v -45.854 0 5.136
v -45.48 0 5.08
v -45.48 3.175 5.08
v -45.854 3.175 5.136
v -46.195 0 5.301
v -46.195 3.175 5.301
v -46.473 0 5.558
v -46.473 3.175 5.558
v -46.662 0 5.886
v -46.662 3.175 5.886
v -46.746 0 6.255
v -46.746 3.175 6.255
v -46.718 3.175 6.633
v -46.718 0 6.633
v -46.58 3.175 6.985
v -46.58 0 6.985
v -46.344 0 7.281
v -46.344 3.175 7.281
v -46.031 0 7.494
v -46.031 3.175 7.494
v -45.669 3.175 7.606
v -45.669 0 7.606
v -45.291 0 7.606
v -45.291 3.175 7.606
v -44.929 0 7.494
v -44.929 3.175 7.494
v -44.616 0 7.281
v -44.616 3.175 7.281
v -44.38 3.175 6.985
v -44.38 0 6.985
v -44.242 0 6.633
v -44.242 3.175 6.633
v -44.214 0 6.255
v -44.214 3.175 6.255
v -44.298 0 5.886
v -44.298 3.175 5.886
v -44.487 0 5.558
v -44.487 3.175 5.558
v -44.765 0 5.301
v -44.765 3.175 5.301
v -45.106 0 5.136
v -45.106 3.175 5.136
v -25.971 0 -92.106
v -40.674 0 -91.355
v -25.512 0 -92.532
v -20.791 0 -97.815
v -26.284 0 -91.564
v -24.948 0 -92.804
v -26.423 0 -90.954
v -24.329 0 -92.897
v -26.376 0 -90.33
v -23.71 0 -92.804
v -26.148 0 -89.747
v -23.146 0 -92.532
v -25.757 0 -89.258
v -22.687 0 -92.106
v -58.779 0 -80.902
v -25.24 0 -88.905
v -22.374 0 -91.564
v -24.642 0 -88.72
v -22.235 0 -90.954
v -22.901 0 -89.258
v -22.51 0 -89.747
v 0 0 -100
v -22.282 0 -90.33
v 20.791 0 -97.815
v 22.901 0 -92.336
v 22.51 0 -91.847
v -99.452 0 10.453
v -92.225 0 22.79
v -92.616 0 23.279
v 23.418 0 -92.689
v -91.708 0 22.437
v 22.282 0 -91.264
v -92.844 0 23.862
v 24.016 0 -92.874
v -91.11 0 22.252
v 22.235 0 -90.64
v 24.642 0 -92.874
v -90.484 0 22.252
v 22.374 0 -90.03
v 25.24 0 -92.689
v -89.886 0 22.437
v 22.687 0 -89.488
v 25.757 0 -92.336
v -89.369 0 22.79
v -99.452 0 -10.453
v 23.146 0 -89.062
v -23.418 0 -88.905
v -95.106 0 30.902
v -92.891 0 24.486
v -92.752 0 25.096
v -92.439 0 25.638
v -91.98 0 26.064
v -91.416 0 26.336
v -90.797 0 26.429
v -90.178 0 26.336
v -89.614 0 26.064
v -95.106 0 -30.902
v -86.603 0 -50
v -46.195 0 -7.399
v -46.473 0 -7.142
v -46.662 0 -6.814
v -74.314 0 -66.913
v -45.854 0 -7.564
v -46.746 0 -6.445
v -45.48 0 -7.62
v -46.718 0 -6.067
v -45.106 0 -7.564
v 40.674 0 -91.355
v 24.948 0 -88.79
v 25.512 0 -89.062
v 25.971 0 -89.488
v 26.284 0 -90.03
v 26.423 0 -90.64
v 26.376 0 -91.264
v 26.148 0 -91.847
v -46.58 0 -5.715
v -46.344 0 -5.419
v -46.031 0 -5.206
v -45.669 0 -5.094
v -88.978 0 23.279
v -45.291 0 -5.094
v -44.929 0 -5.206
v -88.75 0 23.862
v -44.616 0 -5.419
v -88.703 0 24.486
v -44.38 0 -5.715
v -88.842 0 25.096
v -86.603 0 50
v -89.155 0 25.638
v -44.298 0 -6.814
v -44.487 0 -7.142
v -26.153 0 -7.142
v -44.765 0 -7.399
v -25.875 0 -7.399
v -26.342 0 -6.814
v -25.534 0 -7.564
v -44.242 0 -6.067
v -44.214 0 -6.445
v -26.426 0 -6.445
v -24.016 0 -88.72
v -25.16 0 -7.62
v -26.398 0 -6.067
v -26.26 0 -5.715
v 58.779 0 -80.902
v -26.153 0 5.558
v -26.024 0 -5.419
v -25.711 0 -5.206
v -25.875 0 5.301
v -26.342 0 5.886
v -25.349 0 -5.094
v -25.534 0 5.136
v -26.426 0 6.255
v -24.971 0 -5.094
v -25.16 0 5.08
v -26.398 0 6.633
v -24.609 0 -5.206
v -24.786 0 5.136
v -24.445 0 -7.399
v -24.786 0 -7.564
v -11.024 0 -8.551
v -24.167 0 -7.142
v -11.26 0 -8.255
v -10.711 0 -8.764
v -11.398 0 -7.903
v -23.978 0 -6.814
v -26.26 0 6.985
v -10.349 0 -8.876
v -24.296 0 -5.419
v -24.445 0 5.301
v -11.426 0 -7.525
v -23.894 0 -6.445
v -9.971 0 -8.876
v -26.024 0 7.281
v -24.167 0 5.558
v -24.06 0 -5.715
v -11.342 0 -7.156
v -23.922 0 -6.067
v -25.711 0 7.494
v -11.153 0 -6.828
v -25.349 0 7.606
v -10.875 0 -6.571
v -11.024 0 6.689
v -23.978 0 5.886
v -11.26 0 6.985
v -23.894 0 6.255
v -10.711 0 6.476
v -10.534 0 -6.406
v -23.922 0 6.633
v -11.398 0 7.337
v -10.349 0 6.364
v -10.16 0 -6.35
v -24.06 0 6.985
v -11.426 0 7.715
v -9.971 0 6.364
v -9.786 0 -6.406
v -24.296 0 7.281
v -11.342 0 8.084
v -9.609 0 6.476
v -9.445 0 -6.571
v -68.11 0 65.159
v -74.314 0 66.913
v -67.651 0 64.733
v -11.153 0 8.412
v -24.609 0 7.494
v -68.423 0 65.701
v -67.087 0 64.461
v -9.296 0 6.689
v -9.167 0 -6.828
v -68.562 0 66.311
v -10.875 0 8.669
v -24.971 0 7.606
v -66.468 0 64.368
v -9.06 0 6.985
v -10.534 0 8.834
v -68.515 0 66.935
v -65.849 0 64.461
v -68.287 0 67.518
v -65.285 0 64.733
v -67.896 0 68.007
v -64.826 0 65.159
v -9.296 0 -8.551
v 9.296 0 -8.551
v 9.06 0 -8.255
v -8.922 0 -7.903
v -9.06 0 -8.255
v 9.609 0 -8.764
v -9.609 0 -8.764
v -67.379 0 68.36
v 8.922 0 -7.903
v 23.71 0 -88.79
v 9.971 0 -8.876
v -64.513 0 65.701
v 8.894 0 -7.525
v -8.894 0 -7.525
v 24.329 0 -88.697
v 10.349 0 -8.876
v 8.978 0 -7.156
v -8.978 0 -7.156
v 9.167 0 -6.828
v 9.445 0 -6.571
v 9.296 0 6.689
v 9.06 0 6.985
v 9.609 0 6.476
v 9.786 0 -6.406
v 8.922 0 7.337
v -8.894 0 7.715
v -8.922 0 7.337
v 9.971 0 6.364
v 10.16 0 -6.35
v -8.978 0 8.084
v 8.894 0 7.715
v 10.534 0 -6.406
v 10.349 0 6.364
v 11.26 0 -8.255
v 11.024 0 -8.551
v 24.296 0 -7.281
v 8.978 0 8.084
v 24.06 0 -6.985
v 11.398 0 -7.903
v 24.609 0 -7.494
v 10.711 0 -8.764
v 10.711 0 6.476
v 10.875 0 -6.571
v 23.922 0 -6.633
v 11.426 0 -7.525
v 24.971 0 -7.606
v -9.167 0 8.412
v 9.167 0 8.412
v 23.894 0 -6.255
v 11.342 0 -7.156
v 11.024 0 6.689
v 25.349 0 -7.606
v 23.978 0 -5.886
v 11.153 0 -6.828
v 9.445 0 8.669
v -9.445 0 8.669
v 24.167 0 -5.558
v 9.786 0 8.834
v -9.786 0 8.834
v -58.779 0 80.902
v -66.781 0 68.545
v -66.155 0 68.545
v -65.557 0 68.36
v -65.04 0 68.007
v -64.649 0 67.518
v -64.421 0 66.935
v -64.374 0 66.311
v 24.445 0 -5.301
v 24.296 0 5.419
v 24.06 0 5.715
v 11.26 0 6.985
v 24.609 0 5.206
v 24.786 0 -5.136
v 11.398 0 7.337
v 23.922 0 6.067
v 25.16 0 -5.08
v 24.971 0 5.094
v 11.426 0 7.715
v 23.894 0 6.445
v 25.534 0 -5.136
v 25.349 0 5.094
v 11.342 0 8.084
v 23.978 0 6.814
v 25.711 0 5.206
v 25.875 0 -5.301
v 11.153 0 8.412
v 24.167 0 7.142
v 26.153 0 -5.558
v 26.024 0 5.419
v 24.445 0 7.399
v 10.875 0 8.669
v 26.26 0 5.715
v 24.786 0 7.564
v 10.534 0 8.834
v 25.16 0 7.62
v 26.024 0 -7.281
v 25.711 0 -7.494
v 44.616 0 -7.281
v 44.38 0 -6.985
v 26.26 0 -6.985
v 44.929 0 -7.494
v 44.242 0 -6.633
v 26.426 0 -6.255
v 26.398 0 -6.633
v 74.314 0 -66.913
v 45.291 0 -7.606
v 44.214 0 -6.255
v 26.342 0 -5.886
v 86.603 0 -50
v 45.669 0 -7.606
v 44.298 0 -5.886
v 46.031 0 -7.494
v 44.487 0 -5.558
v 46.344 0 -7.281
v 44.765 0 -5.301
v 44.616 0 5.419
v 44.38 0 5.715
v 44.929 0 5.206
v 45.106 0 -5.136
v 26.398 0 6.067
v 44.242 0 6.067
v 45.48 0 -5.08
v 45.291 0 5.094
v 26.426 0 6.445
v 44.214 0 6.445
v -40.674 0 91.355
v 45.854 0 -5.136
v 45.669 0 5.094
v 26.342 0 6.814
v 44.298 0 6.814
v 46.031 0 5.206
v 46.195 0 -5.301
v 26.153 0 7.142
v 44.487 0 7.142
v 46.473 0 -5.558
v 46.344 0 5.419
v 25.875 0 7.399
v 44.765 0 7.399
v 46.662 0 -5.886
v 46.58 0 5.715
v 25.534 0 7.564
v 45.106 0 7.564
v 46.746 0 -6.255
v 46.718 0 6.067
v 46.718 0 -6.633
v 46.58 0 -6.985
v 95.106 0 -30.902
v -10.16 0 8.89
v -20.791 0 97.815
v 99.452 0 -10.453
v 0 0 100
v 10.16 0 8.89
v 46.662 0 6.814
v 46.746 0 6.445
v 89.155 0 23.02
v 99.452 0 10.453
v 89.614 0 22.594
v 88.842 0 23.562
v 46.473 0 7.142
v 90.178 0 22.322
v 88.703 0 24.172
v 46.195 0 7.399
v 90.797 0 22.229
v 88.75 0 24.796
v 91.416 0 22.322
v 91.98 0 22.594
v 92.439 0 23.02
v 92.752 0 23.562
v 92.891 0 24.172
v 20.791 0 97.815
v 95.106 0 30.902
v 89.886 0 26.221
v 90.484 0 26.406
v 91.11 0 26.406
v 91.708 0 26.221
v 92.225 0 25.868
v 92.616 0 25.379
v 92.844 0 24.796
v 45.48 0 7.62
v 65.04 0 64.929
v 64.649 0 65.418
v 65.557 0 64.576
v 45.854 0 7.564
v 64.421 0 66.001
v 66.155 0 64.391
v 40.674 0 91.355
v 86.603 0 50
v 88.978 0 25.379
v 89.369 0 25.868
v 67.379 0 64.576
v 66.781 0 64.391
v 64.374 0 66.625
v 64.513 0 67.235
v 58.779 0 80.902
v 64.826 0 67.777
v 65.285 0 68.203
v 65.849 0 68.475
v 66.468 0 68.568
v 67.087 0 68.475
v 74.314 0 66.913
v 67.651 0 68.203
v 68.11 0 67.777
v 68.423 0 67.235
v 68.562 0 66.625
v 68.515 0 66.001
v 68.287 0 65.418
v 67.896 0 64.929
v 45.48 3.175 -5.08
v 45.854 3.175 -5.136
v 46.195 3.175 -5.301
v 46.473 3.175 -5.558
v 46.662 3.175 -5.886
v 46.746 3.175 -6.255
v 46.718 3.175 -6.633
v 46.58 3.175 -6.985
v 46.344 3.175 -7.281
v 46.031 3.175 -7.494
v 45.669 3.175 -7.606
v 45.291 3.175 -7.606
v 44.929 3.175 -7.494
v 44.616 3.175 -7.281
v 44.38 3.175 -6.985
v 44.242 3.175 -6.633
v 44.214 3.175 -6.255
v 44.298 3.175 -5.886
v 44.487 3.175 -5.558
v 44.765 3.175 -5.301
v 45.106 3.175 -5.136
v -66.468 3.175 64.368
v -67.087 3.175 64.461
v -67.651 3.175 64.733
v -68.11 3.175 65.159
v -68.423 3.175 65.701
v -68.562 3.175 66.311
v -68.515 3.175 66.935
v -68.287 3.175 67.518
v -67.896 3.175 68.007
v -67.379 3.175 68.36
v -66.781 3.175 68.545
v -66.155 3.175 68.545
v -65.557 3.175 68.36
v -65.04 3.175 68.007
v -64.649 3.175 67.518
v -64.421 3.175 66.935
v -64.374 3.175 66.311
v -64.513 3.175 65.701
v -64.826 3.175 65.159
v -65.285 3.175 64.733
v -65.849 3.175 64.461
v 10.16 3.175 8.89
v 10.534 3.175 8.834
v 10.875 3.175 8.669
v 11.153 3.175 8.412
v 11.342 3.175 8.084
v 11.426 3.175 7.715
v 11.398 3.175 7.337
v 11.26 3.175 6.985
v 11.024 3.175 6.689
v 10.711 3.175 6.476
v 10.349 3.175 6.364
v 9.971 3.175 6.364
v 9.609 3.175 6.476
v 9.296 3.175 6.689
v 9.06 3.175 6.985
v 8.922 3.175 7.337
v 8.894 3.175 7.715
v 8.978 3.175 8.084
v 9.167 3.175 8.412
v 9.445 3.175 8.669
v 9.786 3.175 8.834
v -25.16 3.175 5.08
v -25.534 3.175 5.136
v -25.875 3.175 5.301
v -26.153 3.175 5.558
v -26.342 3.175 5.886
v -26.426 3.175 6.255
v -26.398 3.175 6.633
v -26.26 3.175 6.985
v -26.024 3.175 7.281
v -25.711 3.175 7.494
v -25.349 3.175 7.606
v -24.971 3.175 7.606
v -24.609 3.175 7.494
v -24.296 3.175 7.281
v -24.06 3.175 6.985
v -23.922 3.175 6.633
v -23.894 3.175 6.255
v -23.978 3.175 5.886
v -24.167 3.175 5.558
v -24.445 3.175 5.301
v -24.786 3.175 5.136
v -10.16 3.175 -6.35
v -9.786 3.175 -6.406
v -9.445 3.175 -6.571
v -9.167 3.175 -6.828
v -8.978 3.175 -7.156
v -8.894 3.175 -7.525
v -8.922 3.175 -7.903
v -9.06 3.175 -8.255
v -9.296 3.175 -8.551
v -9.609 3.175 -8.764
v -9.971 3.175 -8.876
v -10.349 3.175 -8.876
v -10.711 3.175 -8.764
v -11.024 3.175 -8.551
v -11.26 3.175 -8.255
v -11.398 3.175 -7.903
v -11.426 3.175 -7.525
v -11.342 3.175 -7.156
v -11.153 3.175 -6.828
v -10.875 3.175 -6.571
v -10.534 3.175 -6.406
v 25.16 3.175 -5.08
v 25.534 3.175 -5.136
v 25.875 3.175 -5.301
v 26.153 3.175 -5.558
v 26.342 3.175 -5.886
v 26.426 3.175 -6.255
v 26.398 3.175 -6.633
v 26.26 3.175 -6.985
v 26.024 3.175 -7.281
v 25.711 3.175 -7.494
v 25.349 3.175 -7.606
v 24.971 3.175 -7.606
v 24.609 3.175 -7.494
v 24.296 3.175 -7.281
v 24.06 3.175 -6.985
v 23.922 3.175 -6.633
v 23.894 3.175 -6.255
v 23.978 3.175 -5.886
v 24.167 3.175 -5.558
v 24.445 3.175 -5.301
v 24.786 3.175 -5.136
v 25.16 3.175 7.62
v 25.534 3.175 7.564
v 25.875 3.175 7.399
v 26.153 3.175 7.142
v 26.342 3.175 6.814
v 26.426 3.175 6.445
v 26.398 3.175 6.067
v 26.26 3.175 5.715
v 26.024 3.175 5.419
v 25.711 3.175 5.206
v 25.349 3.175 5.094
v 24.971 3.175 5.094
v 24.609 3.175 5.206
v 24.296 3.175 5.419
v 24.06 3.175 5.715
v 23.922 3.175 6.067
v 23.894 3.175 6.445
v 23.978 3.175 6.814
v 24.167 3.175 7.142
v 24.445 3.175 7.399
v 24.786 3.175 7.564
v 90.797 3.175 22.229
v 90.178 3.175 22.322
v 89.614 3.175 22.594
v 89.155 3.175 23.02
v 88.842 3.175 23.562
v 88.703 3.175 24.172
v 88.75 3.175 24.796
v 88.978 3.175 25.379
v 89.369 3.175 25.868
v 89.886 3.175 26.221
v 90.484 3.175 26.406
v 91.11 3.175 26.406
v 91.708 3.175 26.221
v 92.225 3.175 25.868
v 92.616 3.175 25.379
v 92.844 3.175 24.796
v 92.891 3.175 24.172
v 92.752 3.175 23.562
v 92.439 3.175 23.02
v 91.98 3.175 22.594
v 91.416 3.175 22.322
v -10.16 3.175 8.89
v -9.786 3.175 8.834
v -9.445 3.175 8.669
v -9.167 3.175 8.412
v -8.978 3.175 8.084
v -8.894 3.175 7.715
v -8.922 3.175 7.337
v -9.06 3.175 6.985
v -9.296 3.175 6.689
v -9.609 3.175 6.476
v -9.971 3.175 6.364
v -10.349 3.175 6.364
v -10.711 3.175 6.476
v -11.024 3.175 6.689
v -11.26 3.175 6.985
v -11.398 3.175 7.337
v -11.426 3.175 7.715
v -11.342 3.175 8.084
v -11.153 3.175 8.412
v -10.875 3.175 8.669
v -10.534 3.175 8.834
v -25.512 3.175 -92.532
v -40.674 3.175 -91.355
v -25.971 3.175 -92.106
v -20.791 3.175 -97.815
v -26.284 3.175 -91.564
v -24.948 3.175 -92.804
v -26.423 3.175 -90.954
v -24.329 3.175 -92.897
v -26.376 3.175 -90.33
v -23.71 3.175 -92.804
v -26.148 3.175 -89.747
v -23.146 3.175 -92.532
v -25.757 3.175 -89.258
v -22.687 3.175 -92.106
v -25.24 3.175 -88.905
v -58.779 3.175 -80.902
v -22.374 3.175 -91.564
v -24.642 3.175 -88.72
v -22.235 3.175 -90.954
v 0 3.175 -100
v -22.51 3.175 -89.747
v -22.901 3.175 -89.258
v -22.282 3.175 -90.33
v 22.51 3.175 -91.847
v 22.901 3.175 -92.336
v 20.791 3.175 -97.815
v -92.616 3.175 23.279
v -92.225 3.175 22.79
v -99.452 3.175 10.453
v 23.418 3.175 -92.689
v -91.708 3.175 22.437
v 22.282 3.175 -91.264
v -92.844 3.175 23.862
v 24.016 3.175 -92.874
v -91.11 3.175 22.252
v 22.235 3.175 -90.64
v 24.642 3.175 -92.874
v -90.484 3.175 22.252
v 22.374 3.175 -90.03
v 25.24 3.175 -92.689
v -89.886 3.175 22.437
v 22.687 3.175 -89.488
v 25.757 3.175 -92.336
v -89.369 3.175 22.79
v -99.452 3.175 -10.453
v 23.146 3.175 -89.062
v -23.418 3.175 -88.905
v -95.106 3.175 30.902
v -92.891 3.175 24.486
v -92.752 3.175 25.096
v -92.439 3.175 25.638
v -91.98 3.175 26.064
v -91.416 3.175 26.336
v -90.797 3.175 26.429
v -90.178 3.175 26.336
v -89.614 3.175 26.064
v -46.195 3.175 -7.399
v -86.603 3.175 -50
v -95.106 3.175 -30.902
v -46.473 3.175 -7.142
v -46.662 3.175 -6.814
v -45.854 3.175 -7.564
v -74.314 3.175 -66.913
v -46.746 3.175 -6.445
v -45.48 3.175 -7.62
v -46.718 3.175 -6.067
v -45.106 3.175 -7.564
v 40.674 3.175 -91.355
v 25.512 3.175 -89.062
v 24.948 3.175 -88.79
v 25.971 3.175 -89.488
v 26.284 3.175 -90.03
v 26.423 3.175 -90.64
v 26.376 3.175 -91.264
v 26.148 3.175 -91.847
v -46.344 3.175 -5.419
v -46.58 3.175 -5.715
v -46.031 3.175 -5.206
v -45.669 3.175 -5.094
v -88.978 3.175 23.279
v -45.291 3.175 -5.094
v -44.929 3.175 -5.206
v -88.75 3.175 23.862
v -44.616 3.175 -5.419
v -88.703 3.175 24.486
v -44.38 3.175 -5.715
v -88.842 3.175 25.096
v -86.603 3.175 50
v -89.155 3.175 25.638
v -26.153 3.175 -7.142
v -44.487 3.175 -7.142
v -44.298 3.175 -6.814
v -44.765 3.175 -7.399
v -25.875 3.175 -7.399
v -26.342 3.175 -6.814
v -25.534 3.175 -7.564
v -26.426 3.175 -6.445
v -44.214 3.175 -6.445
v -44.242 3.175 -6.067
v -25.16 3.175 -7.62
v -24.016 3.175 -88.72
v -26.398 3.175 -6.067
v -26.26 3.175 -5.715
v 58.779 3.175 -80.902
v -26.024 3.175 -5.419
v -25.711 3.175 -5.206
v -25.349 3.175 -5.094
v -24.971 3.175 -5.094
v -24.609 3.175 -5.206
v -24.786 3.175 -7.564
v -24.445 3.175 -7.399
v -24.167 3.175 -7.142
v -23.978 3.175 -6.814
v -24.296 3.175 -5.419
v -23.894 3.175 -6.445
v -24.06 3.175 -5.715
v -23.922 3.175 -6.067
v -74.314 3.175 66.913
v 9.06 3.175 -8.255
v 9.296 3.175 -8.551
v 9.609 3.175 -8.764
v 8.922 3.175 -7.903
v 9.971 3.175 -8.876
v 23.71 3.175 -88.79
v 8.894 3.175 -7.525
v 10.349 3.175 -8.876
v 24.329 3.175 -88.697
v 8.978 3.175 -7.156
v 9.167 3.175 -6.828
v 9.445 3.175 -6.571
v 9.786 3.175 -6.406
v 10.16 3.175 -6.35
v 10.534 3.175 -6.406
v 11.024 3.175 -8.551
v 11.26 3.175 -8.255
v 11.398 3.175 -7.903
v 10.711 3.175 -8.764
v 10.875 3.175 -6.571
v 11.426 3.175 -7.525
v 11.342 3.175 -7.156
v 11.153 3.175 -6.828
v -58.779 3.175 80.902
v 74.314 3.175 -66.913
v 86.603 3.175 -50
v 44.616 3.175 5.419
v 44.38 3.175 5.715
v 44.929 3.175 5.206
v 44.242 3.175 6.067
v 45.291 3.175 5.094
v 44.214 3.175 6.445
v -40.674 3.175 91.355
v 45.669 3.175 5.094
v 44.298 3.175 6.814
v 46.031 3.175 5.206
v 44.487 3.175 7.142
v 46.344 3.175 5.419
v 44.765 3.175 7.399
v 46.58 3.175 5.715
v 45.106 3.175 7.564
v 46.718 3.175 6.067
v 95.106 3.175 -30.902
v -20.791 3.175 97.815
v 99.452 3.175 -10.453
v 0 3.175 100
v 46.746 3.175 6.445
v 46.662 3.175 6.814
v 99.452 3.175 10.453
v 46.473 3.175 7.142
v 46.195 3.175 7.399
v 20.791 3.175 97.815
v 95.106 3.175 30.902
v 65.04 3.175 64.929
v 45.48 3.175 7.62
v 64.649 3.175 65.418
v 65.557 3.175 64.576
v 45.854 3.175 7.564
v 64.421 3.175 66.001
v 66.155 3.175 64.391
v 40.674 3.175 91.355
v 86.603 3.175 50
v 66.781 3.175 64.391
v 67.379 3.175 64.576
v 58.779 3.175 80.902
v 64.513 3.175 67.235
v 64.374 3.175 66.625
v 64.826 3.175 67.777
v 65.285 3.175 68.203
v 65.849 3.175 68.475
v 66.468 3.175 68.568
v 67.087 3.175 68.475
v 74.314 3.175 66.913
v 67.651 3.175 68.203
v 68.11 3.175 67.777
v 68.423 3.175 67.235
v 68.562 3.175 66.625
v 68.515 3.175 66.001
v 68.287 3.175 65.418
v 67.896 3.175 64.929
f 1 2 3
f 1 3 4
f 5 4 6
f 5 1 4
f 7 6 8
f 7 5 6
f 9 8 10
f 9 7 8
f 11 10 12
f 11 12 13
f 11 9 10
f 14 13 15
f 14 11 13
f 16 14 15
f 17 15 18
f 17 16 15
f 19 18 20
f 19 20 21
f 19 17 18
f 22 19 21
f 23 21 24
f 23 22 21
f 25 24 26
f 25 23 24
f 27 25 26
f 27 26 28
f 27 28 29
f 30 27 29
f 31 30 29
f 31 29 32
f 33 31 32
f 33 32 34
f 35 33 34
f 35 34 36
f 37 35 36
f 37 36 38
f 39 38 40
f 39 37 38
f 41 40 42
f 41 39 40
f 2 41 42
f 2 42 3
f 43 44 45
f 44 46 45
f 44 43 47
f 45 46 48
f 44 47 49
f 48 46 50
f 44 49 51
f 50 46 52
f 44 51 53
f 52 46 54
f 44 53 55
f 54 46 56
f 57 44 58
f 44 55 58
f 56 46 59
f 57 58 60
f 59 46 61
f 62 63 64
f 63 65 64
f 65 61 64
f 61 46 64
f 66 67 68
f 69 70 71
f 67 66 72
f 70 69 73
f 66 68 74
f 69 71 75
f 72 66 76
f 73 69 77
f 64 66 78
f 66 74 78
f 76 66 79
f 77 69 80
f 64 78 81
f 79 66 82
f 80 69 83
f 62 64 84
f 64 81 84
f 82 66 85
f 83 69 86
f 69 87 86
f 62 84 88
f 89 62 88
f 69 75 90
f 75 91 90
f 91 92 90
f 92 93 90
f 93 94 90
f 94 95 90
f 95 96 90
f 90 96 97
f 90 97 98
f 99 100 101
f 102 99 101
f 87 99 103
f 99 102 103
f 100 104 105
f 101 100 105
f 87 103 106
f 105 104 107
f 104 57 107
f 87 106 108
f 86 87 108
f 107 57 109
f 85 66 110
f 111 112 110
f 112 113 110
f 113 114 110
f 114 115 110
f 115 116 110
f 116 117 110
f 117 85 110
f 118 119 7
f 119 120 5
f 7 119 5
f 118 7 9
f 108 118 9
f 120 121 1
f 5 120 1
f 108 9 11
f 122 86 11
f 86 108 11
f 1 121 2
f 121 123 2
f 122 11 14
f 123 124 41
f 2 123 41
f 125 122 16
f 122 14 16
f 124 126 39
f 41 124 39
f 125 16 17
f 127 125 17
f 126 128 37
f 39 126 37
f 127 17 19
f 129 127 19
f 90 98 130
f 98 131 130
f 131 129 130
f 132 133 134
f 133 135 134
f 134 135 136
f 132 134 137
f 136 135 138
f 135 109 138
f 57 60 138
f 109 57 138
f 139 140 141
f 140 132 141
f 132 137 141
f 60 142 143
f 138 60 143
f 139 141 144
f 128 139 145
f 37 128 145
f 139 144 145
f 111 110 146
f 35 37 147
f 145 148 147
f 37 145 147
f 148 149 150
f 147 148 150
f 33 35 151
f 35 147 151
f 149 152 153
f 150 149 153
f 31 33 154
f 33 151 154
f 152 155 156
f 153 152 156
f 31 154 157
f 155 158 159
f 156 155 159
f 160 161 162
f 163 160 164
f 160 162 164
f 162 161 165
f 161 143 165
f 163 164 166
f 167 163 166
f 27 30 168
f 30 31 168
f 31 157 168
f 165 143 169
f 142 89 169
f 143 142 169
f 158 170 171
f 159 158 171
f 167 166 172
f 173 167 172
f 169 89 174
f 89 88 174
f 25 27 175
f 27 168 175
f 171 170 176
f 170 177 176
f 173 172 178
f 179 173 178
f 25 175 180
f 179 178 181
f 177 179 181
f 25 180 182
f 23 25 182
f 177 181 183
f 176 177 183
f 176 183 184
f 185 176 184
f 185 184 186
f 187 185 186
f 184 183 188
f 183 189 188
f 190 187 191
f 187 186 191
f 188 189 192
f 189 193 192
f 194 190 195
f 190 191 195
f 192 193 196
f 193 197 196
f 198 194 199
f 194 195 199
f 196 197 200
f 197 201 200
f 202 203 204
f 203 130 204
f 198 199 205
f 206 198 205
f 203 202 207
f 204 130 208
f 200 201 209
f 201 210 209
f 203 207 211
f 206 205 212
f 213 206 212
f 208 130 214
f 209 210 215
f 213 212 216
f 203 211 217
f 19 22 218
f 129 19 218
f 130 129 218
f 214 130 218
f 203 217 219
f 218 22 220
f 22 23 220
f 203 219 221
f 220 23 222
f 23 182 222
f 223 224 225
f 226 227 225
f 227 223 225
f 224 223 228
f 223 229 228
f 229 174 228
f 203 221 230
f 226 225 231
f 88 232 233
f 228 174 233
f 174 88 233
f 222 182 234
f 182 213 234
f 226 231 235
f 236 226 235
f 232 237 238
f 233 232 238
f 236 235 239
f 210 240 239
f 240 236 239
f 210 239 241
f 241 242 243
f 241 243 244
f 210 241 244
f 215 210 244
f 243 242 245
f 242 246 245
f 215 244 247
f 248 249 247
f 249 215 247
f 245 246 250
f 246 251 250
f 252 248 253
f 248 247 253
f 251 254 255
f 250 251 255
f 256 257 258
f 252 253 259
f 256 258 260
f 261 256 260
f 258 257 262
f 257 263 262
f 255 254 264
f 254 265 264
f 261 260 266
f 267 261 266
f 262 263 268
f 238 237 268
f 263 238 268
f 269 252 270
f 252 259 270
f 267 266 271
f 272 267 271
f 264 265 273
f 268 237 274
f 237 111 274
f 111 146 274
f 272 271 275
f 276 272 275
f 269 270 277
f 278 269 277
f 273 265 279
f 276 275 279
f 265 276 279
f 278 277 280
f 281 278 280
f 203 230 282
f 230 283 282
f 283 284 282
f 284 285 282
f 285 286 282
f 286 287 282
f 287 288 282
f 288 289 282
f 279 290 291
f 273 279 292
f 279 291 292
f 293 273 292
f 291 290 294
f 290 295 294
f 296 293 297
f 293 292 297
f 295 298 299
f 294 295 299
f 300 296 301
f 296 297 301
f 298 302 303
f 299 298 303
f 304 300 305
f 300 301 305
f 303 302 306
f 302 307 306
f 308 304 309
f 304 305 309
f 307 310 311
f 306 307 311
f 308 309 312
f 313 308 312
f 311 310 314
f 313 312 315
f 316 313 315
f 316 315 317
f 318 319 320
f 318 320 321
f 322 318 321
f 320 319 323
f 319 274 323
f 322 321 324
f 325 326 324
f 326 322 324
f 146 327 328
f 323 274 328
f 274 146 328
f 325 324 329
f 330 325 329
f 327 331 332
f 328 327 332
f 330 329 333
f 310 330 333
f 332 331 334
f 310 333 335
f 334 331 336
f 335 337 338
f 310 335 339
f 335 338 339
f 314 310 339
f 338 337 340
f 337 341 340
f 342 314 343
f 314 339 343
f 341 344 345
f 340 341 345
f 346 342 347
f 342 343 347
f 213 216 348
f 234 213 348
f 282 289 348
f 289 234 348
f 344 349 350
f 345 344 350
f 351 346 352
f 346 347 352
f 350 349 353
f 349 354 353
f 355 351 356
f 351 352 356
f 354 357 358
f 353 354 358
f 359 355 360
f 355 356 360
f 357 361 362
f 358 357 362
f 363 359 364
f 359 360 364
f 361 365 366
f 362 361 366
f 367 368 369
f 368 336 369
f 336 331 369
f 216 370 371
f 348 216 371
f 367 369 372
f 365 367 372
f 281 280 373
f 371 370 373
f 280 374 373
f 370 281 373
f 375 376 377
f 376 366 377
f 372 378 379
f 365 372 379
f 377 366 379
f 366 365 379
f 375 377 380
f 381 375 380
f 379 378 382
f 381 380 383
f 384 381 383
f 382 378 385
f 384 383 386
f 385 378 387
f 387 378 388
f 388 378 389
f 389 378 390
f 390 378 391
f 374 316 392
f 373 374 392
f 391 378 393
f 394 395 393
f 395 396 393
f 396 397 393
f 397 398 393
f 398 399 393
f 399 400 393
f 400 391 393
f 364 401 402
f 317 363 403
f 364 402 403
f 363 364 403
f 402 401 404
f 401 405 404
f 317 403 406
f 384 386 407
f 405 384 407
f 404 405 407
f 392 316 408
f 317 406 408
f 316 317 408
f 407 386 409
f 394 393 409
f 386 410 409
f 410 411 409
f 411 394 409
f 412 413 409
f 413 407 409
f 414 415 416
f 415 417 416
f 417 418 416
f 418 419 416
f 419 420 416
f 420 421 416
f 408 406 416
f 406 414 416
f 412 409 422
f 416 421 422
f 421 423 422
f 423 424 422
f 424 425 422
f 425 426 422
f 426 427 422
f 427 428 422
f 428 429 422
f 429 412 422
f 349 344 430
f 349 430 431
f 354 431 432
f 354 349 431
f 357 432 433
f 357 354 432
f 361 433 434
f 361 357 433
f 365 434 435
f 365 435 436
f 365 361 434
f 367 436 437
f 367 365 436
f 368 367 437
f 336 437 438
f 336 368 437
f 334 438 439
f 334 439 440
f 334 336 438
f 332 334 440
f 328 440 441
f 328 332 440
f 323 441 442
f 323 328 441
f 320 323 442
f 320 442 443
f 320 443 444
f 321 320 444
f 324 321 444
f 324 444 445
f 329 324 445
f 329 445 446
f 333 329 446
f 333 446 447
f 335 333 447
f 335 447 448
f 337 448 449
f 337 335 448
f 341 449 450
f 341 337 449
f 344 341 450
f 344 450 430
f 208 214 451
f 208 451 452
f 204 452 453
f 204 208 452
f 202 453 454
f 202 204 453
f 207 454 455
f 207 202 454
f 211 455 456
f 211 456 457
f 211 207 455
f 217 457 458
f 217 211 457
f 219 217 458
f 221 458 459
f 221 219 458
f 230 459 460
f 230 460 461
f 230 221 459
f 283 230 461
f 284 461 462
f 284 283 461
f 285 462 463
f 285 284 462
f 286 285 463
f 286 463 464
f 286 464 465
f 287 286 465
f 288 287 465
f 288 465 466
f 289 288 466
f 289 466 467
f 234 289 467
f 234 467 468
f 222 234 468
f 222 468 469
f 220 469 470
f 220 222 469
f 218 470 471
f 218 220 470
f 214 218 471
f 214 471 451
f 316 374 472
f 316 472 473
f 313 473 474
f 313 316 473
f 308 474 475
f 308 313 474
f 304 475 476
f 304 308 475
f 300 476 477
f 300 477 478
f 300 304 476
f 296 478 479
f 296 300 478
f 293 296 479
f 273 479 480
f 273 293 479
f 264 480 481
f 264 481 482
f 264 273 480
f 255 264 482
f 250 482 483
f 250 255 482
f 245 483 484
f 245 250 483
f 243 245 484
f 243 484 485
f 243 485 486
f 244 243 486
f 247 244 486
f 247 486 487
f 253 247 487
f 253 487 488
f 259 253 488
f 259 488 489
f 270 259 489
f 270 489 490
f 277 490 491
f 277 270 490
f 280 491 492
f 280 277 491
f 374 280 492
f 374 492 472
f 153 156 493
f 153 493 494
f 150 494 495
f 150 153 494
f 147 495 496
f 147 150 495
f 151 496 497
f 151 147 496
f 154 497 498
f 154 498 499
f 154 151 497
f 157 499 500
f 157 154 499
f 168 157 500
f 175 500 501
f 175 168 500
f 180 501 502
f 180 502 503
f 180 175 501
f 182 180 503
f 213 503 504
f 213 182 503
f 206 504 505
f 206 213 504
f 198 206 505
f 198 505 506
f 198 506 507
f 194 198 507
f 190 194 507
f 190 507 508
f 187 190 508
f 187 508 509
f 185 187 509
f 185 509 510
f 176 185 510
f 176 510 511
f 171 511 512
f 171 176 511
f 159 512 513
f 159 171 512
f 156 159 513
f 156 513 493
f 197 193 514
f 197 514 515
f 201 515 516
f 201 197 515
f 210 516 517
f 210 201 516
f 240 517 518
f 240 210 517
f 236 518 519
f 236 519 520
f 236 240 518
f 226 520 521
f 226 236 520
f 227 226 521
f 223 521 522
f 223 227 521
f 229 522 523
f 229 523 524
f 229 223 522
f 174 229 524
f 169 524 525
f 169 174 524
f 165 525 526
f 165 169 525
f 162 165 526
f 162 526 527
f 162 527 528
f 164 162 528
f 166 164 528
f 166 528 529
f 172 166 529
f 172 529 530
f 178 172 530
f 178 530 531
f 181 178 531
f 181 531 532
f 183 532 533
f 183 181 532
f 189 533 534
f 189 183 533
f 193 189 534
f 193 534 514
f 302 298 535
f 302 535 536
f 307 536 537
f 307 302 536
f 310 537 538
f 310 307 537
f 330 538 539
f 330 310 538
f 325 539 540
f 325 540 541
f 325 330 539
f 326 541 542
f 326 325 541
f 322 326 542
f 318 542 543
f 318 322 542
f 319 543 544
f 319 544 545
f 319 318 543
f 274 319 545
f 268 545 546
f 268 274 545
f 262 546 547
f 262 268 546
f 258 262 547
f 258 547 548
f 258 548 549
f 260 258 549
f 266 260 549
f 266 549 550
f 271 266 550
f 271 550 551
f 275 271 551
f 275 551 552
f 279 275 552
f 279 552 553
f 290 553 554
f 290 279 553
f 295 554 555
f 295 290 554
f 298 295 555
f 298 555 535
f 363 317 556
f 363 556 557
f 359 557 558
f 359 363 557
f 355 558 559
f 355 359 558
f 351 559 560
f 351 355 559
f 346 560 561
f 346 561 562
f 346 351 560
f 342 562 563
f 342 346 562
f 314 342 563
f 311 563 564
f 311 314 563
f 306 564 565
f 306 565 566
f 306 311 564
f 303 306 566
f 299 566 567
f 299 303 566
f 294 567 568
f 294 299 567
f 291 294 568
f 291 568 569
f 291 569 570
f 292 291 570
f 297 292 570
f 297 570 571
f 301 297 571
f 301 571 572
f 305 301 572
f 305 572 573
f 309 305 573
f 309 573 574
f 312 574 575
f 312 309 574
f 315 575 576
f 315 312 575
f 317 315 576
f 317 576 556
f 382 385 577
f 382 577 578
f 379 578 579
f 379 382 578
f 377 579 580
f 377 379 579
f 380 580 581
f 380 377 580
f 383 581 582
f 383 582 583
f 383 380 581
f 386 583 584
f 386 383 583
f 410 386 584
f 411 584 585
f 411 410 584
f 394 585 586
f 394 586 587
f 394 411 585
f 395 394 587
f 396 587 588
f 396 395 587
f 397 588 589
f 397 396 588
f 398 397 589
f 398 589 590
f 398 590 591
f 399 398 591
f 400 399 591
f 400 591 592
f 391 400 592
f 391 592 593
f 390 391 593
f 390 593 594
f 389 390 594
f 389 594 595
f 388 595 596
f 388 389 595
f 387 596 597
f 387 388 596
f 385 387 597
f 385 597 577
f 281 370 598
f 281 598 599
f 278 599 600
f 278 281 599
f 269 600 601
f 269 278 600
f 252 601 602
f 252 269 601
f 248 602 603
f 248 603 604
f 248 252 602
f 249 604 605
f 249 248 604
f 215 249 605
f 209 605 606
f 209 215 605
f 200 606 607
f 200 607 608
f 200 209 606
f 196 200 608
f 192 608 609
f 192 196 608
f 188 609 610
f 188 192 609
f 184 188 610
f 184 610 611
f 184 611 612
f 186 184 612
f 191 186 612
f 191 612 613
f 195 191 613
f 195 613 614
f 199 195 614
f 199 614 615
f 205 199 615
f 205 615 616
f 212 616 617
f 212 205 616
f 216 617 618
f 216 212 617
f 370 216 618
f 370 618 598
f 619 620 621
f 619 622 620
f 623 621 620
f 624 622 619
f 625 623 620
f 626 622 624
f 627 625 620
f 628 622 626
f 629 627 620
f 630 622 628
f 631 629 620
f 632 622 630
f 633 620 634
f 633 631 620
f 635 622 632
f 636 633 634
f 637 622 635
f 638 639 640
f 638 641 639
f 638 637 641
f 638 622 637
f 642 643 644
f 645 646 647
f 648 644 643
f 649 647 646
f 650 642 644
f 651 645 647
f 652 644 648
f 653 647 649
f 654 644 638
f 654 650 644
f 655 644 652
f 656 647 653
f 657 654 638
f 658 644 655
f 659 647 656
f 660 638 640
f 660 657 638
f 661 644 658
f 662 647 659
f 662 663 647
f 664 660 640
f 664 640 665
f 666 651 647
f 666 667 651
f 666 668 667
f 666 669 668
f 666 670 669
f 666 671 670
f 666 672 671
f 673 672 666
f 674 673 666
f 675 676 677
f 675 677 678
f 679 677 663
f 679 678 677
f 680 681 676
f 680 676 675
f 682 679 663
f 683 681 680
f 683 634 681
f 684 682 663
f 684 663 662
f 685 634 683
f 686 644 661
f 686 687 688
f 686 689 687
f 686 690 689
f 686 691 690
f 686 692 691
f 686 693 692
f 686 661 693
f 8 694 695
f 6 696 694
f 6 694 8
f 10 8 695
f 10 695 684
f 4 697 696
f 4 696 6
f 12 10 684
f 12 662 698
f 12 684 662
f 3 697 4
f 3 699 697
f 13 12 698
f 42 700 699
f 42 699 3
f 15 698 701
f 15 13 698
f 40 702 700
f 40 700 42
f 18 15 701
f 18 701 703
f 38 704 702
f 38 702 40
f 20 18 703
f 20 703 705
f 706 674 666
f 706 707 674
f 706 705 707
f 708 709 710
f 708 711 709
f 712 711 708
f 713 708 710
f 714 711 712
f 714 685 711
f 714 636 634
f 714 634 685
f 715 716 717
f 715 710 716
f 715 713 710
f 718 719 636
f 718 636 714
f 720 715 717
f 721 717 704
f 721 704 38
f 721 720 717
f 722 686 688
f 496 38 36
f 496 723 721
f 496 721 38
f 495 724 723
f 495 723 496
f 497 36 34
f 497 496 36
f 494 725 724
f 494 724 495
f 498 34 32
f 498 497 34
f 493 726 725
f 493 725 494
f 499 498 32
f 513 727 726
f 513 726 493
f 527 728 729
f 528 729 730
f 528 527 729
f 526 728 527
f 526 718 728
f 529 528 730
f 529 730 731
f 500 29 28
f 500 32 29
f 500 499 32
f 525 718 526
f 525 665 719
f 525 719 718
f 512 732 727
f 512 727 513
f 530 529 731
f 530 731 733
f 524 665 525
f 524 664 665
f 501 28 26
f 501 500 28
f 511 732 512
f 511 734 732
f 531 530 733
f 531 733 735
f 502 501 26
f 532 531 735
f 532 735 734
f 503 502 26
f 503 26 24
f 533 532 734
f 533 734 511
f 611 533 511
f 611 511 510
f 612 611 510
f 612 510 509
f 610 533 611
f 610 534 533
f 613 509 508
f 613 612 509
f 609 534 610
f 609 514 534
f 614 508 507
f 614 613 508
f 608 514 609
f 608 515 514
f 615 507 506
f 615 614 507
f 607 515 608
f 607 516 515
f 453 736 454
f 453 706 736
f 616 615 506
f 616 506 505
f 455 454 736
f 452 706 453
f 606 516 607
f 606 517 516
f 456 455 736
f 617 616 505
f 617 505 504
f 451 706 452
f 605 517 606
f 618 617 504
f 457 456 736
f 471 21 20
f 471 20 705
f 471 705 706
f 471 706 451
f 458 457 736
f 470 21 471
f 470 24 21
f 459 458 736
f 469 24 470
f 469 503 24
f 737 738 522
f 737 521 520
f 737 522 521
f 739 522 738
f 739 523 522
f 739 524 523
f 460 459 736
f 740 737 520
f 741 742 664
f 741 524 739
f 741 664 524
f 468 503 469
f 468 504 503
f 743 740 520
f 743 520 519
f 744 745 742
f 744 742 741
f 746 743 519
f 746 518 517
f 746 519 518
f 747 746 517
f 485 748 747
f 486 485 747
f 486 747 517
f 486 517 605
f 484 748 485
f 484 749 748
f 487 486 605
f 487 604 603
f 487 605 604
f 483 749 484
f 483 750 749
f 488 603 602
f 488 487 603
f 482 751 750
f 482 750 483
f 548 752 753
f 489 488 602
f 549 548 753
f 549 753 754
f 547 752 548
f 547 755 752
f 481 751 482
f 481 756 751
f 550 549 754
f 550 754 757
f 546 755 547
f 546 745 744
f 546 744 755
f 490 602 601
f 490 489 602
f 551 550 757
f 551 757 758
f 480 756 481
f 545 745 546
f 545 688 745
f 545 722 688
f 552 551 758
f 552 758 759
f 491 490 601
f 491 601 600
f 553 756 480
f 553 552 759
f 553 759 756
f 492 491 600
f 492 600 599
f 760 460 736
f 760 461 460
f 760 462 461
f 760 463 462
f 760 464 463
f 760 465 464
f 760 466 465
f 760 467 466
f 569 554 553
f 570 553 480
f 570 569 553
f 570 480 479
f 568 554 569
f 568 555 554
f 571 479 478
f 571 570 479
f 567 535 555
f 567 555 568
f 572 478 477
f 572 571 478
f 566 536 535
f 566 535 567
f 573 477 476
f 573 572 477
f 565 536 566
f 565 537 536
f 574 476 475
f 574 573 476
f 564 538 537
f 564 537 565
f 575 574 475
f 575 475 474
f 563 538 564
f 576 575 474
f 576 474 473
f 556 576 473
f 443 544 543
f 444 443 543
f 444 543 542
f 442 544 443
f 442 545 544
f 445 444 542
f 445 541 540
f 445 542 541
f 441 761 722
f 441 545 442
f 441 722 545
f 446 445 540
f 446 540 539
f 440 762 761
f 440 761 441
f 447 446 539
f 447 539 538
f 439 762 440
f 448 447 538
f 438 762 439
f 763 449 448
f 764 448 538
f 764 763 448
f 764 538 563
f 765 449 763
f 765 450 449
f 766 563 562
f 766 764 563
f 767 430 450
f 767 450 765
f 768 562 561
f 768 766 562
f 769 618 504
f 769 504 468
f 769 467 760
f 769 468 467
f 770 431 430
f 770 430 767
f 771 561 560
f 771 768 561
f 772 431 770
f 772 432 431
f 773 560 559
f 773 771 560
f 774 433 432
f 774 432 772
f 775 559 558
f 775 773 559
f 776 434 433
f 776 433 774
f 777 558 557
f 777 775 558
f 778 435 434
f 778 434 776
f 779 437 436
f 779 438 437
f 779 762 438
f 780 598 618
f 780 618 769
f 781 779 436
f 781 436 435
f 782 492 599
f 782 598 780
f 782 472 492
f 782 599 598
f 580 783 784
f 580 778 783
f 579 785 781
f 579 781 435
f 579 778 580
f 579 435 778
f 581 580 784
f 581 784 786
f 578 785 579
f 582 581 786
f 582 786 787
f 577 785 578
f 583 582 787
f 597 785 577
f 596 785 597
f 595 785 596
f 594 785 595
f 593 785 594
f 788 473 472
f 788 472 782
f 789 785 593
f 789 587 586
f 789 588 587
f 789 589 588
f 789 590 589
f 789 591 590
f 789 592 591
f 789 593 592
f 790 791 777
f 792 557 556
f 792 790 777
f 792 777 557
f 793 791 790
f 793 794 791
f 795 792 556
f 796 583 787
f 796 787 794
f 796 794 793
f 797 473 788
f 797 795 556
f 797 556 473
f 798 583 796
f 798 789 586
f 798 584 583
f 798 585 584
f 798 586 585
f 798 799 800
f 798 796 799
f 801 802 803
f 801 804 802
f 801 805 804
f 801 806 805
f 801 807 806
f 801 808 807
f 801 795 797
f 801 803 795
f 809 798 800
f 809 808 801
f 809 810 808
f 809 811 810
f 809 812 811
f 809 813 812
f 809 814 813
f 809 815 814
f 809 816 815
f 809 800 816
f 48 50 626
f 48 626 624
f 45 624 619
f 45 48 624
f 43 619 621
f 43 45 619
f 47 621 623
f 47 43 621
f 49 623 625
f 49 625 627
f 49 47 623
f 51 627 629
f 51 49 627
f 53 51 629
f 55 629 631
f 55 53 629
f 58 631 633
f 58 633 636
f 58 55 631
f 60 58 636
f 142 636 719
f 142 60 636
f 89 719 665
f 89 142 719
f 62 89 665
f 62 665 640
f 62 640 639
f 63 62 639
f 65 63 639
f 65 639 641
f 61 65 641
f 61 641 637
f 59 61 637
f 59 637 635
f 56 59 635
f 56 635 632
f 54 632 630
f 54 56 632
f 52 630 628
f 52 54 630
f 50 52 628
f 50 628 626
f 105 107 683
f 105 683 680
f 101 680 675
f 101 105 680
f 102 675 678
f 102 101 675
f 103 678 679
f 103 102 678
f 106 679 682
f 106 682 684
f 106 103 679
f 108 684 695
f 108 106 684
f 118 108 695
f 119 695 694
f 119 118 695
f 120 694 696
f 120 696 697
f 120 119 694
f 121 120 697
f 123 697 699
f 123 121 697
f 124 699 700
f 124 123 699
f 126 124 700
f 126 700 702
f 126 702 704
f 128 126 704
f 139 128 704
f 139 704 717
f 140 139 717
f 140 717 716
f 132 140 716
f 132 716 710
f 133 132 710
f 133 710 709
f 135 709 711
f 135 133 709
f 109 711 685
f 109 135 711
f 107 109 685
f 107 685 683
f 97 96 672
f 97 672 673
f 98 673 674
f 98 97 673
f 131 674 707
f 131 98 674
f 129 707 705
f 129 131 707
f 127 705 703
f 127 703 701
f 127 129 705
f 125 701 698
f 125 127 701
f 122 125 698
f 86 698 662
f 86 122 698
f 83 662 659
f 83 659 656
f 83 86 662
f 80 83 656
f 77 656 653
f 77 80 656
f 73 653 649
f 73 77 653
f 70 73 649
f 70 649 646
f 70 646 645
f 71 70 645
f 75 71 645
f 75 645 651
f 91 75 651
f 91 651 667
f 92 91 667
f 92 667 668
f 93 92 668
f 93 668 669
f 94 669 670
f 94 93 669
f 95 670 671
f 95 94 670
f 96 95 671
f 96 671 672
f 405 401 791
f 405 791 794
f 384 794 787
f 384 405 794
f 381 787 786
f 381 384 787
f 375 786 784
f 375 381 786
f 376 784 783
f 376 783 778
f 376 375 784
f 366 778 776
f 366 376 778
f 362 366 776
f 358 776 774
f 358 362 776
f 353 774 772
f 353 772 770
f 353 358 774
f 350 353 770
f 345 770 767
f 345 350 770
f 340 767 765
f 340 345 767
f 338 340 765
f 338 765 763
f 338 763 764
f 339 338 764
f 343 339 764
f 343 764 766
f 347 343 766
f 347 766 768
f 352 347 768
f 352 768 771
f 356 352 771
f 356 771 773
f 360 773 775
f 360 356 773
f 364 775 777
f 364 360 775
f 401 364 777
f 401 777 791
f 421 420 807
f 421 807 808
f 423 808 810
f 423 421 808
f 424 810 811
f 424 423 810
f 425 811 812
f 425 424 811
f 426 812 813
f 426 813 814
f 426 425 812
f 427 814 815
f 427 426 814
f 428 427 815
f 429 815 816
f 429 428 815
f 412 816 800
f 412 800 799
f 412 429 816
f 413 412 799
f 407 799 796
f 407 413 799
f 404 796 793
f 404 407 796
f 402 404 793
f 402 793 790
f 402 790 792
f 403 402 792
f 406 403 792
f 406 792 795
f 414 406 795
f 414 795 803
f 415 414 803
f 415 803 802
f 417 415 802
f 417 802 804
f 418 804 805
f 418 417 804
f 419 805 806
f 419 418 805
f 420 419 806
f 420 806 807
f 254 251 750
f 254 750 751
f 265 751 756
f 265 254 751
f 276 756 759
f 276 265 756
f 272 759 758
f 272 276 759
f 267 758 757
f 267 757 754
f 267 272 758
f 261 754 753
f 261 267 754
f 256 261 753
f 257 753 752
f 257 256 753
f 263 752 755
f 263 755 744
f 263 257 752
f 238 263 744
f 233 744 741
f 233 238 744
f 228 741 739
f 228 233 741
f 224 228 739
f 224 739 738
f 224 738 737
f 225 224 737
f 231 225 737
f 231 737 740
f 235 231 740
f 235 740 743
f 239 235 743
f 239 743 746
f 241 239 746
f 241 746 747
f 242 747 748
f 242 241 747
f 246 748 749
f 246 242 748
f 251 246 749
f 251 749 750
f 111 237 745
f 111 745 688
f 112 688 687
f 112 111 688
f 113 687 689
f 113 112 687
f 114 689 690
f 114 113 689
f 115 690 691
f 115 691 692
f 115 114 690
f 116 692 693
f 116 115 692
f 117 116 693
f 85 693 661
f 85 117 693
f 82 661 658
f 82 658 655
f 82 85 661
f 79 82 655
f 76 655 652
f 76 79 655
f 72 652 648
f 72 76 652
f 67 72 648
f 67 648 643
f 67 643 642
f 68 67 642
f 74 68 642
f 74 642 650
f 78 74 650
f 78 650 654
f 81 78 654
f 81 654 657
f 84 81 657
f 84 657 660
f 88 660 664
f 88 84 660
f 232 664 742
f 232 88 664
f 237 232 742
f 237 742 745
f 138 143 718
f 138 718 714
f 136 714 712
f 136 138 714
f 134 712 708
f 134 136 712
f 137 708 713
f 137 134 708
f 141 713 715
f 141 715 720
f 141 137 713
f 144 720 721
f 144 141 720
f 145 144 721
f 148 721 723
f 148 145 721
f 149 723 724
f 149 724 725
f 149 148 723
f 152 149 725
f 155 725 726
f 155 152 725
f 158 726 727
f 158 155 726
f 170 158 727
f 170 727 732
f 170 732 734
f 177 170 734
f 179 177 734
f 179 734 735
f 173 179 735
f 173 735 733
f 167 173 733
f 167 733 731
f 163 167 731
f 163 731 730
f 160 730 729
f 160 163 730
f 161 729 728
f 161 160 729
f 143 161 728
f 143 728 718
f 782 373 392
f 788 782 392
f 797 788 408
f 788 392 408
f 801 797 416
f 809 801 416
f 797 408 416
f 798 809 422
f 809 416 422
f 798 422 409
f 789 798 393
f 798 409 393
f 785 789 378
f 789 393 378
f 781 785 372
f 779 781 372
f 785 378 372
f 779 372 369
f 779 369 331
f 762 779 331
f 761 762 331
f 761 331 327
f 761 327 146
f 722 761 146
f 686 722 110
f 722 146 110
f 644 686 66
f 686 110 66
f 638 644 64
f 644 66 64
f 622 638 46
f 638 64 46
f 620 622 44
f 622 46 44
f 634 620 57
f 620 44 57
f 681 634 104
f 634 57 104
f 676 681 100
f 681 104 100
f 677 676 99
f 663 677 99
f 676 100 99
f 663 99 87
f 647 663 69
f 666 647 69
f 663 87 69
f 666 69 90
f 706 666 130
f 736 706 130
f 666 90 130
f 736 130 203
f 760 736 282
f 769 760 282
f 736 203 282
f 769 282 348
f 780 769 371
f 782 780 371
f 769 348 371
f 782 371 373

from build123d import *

# Parameters (mm, degrees)
SKETCH1_R           = 100
SKETCH1_R_2         = 2.1
SKETCH1_R_3         = 1.27
BOSS_EXTRUDE1_DEPTH = 3.175


with BuildPart() as part:
    # Sketch1 → Boss-Extrude1 (new body)
    with BuildSketch(Plane(origin=(0, 0, 0), x_dir=(1, 0, 0), z_dir=(0, 1, 0))):
        with Locations(Location((0, 0, 0), (0, 0, 270))):
            Circle(SKETCH1_R)
        with Locations(Location((24.32899024, 90.797027671, 0), (0, 0, 270))):
            Circle(SKETCH1_R_2, mode=Mode.SUBTRACT)
        with Locations(Location((-24.32899024, 90.797027671, 0), (0, 0, 90))):
            Circle(SKETCH1_R_2, mode=Mode.SUBTRACT)
        with Locations(Location((90.797027671, -24.32899024, 0), (0, 0, 90))):
            Circle(SKETCH1_R_2, mode=Mode.SUBTRACT)
        with Locations(Location((66.468037432, -66.468037432, 0), (0, 0, 270))):
            Circle(SKETCH1_R_2, mode=Mode.SUBTRACT)
        with Locations(Location((-66.468037432, -66.468037432, 0), (0, 0, 90))):
            Circle(SKETCH1_R_2, mode=Mode.SUBTRACT)
        with Locations(Location((-90.797027671, -24.32899024, 0), (0, 0, 270))):
            Circle(SKETCH1_R_2, mode=Mode.SUBTRACT)
        with Locations(Location((-10.16, 7.62, 0), (0, 0, 270))):
            Circle(SKETCH1_R_3, mode=Mode.SUBTRACT)
        with Locations(Location((-10.16, -7.62, 0), (0, 0, 270))):
            Circle(SKETCH1_R_3, mode=Mode.SUBTRACT)
        with Locations(Location((10.16, -7.62, 0), (0, 0, 270))):
            Circle(SKETCH1_R_3, mode=Mode.SUBTRACT)
        with Locations(Location((10.16, 7.62, 0), (0, 0, 270))):
            Circle(SKETCH1_R_3, mode=Mode.SUBTRACT)
        with Locations(Location((25.16, 6.35, 0), (0, 0, 270))):
            Circle(SKETCH1_R_3, mode=Mode.SUBTRACT)
        with Locations(Location((25.16, -6.35, 0), (0, 0, 270))):
            Circle(SKETCH1_R_3, mode=Mode.SUBTRACT)
        with Locations(Location((45.48, -6.35, 0), (0, 0, 270))):
            Circle(SKETCH1_R_3, mode=Mode.SUBTRACT)
        with Locations(Location((45.48, 6.35, 0), (0, 0, 270))):
            Circle(SKETCH1_R_3, mode=Mode.SUBTRACT)
        with Locations(Location((-45.48, 6.35, 0), (0, 0, 90))):
            Circle(SKETCH1_R_3, mode=Mode.SUBTRACT)
        with Locations(Location((-45.48, -6.35, 0), (0, 0, 90))):
            Circle(SKETCH1_R_3, mode=Mode.SUBTRACT)
        with Locations(Location((-25.16, -6.35, 0), (0, 0, 90))):
            Circle(SKETCH1_R_3, mode=Mode.SUBTRACT)
        with Locations(Location((-25.16, 6.35, 0), (0, 0, 90))):
            Circle(SKETCH1_R_3, mode=Mode.SUBTRACT)
    extrude(amount=BOSS_EXTRUDE1_DEPTH)


solid = part.part
